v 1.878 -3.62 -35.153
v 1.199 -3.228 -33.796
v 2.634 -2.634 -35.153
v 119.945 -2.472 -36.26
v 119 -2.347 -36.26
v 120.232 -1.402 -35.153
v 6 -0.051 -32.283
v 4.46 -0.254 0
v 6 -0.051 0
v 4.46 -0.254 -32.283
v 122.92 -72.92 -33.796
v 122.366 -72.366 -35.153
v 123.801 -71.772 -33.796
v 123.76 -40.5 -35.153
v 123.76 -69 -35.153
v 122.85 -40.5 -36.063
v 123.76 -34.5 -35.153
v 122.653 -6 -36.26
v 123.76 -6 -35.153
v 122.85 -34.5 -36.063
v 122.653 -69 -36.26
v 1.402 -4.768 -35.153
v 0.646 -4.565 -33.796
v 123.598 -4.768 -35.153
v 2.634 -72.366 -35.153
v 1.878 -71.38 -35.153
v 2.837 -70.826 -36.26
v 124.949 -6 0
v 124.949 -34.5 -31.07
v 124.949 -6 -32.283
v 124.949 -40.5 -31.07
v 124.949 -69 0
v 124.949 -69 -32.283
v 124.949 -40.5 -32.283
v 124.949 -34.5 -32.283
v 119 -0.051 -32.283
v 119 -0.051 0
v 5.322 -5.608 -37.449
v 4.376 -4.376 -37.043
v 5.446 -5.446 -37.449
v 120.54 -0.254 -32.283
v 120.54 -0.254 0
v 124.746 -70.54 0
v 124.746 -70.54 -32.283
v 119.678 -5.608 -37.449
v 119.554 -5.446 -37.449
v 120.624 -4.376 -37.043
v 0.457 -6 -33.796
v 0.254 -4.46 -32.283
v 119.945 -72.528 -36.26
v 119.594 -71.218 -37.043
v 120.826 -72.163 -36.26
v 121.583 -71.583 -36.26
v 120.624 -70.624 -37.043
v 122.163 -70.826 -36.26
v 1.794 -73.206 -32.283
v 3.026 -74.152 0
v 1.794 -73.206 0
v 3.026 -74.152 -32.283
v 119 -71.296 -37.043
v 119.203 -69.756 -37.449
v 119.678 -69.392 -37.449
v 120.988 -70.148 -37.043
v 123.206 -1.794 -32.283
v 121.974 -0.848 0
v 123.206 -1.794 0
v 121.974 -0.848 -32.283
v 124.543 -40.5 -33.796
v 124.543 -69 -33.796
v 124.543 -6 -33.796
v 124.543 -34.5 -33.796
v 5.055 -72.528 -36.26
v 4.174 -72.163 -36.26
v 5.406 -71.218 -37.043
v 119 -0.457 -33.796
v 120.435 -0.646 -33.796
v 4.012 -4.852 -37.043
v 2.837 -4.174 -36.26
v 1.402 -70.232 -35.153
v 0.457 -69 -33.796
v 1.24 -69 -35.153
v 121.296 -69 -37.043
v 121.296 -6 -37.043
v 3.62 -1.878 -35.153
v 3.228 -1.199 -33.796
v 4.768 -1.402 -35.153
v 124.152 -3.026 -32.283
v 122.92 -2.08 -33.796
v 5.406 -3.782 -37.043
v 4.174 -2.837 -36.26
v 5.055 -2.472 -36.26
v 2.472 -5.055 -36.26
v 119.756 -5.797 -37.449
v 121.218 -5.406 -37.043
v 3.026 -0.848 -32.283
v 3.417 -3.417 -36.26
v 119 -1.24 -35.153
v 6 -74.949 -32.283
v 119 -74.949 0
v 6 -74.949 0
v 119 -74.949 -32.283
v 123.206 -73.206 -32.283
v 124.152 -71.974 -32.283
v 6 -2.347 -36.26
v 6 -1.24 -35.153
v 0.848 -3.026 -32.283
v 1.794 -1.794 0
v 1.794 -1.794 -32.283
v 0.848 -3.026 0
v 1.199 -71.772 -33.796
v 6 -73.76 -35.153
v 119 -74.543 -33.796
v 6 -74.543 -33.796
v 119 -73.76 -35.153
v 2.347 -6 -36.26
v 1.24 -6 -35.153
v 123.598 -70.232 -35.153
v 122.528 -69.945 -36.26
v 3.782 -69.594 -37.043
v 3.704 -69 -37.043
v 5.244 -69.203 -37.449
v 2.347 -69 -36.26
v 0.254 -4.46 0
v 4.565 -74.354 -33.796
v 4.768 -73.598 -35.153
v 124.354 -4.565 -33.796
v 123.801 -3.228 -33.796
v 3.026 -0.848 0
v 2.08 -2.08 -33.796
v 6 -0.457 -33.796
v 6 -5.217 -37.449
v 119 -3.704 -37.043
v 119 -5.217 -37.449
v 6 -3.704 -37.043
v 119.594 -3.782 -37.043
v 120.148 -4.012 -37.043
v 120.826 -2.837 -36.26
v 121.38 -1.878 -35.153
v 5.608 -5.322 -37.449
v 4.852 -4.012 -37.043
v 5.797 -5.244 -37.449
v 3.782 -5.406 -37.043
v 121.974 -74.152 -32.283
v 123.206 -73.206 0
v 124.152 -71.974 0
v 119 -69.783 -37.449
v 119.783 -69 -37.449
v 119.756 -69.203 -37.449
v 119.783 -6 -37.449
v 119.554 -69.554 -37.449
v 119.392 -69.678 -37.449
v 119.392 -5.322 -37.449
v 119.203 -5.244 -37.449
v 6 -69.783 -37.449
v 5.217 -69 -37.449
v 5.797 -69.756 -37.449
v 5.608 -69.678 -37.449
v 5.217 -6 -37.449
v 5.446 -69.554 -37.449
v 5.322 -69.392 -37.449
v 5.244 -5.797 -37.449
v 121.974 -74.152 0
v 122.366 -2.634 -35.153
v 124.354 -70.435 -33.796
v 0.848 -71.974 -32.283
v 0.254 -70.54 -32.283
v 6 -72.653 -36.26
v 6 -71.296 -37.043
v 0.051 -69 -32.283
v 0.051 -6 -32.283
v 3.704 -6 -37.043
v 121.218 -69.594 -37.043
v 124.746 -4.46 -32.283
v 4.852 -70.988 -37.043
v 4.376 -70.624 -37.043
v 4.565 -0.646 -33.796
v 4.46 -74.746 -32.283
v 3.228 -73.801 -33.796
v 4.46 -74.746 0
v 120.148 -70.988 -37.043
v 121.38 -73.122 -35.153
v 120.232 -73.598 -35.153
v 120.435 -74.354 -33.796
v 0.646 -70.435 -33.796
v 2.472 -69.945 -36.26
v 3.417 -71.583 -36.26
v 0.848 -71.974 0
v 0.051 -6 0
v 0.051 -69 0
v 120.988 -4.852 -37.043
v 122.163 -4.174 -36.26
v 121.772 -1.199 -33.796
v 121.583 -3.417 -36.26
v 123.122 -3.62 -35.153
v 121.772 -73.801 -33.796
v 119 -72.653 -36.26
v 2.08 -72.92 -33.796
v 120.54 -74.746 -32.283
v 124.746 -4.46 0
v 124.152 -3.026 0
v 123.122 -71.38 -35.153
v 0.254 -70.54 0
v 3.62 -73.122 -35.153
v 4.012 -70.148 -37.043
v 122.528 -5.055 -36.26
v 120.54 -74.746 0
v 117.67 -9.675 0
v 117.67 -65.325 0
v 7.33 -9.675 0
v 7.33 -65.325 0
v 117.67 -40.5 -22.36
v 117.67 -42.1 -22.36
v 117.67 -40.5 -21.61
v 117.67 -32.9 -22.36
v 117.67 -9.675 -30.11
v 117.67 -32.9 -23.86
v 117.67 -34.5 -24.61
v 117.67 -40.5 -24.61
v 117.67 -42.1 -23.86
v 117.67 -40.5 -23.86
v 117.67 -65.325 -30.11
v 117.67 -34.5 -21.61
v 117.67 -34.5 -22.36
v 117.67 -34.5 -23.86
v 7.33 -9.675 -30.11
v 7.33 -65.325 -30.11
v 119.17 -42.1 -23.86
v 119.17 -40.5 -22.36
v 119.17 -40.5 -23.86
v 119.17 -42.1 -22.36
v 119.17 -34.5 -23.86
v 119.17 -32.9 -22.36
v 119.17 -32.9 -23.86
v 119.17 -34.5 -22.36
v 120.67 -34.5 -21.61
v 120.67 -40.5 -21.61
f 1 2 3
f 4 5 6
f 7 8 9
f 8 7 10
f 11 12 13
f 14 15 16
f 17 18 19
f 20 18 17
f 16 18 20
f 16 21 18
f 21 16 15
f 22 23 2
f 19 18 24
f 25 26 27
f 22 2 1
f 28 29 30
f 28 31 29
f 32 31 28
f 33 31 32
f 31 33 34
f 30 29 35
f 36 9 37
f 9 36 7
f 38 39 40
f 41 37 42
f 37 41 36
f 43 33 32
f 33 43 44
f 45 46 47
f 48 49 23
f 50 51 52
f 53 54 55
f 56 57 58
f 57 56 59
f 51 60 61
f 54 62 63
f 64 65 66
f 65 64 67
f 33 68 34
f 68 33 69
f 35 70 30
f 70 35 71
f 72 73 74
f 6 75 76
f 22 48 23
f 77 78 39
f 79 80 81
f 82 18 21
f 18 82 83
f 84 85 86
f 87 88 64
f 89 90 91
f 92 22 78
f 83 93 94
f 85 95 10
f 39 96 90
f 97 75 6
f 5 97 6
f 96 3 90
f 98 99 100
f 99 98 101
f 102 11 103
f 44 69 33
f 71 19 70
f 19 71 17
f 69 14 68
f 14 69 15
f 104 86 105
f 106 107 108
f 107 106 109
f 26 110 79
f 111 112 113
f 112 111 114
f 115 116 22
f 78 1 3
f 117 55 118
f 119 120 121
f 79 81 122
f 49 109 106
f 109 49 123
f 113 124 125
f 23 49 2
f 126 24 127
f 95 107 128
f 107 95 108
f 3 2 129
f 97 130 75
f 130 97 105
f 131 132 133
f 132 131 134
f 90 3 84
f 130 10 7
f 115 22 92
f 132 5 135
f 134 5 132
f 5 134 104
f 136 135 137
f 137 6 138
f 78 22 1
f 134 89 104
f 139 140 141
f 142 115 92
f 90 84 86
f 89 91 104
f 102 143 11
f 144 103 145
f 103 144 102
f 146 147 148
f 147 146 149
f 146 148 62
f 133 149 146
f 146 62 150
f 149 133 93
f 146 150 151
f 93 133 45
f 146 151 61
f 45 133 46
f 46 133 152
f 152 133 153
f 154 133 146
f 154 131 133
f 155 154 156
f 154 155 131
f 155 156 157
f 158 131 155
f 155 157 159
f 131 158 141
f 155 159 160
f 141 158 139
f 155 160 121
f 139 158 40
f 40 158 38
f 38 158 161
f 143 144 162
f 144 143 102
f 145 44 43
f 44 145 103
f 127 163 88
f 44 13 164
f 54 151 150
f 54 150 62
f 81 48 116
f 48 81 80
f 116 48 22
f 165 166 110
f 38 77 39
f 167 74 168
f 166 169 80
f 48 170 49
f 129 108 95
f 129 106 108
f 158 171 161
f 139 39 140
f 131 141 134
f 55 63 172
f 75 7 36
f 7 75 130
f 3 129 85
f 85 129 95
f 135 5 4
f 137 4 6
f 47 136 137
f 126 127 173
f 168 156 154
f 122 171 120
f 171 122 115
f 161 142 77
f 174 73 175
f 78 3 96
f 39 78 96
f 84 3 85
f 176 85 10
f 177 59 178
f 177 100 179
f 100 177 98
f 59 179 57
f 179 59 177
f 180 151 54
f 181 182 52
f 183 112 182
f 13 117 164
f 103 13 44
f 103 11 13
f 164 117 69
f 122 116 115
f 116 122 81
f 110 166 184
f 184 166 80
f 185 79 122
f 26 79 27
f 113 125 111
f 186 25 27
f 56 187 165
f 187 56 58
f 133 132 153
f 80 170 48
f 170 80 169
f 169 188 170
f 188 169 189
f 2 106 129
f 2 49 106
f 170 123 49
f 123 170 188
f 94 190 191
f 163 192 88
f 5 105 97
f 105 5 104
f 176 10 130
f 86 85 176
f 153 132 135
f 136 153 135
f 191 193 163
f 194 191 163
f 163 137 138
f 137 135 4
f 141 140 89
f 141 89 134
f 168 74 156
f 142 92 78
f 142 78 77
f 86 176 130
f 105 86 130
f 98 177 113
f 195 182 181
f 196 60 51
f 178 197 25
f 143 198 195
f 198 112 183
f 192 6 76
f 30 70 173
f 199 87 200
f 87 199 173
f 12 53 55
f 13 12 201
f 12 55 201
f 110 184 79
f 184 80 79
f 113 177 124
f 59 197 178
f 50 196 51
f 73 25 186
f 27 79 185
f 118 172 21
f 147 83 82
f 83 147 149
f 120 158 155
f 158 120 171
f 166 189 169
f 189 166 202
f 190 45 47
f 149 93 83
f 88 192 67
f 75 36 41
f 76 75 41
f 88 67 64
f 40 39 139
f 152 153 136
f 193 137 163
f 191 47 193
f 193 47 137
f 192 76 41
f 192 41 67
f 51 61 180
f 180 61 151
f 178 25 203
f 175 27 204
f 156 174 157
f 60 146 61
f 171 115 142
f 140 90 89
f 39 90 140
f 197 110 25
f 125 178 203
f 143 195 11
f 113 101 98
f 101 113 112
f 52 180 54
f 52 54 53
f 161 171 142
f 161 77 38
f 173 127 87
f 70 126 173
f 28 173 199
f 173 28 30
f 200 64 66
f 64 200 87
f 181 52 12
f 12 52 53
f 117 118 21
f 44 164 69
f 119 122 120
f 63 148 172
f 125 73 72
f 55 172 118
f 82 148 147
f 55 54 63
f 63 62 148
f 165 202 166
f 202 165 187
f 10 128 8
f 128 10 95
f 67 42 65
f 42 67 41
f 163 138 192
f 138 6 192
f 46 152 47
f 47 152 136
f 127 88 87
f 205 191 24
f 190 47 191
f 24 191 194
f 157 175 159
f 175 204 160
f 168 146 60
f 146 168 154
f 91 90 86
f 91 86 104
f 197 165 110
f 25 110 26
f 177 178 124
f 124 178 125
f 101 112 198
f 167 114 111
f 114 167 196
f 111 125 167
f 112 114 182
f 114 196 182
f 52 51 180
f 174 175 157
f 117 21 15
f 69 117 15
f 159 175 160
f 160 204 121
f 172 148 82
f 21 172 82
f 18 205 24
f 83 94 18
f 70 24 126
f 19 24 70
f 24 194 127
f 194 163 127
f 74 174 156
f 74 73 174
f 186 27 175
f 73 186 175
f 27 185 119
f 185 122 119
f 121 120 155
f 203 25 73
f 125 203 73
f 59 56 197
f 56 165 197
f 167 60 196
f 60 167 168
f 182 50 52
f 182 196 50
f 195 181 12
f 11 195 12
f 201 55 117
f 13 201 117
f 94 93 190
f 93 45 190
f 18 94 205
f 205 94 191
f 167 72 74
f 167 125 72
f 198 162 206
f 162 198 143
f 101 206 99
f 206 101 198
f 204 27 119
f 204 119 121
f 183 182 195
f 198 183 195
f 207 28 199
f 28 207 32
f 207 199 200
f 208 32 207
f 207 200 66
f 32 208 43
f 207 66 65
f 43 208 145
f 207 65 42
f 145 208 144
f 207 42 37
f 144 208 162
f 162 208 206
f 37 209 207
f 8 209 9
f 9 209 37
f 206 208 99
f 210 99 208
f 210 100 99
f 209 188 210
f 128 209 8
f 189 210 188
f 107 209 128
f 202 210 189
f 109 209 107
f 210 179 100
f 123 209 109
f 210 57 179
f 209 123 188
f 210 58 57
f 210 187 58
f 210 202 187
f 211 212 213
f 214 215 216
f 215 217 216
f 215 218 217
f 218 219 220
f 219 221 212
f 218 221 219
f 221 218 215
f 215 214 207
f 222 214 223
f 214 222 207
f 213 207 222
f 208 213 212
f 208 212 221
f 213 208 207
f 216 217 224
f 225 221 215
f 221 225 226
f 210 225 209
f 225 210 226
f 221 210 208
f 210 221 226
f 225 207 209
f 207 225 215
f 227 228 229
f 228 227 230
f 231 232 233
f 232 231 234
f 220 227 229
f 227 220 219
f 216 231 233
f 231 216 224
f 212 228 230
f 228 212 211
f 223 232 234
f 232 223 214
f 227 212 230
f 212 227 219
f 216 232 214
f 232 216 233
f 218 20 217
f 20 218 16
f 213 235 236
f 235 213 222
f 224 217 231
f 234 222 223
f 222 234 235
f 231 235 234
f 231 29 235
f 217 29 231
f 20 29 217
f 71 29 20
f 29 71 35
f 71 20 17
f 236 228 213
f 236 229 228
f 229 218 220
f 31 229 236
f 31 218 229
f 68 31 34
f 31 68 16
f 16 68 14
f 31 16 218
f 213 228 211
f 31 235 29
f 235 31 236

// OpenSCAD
// a bit of an experiment in using an operator module. All the measurments
// are "known" by battery_holder_cavity, and things that use battery_holder_cavity
// don't have to know exactly where the wires exit in order to be able to
// link them up with the "hull" operator.

/*
A cavity into which I can mount one of these. 
https://www.jaycar.com.au/4-x-c-cell-2-rows-of-2-end-to-end-battery-holder/p/PH9216
The battery holder has a couple of screwholes in the base.
The cavity has the xy centered at the origin, and is longer in the x direction.
The cavity sits as z=0, but extends a little below this to avoid coplanar
surfaces when it is subtracted from a volume.

The wires come out from the cavity at the x end.

If position=exit is true, then instead of drawing a cavity, this module
will draw child module 0 centered at a reasonable point for wire routing to start.
This allows you to use hull to make a connecting channel for the wire
of the shape you choose.

*/



module battery_holder_cavity(position_exit = false) {
    
    // dimensions taken from the object
    holder_length = 108.34;
    holder_height = 28.11;
    holder_width = 53.65;
    
    wire_exit_width = 9.2;
    wire_exit_height = 7;
    wire_thickness = 1.5; // with some slop
    
    // my dimensions
    // don't want the batteries actually resting on the floor
    height_off_floor = 2; 
    // leave a bit of a gap so I can actually insert the holder in the cavity
    edge_play = 1;
    // extend the cavity downwards to zap coplanar surfaces
    coplanar_shave = 0.1;

        if(!position_exit) {
            translate([
                (holder_length + edge_play * 2)/-2,
                (holder_width + edge_play * 2)/-2,
                -coplanar_shave
            ])
            cube([
                holder_length + edge_play * 2,
                holder_width + edge_play * 2,
                holder_height + height_off_floor + coplanar_shave
            ]);
    
            translate([
                (holder_length + edge_play * 2)/2+wire_thickness/2,
                0,
                height_off_floor + holder_height - wire_exit_height
            ])
            cube([wire_thickness,wire_exit_width,wire_thickness], center = true);
        }
        else {
            translate([
            holder_length/2+edge_play+wire_thickness,
            0,
            height_off_floor + holder_height - wire_exit_height
            ])
            children(0);
        }
}

// this thing is a gap for the wires to pass through. It's sized to admit
// the headers on the end of the wire that I currently have soldered to the 
// battery.

module wire_channel() {
    cube([3,6,3], center=true);
}

module holder_body() {
    rad = 6;
difference() {
    translate([rad,rad,0])
    minkowski() {
        cube([25*5 - rad*2 , 25*3 -rad*2 , 25 * 1.5 -rad]);
        sphere(r=rad, $fn = 24);
    }
    translate([0,0,-rad-1])
        cube([25*5, 25*3 , rad+1]);
}
}



rotate(180,[1,0,0])
difference()  {
    holder_body();
    translate([25*2.5, 25*1.5, 0]) {
        battery_holder_cavity();
        hull() {
            battery_holder_cavity(position_exit=true) wire_channel();
            translate([25*2.5, 0, 25*1.5-1.5]) wire_channel();
        }
    }
 }
 
